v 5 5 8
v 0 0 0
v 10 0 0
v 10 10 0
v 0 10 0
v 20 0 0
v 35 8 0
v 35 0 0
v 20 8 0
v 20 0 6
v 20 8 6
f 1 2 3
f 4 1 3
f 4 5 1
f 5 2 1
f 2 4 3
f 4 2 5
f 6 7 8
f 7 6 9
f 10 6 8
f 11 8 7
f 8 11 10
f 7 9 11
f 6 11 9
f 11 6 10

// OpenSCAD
// Purpose: polyhedron – pyramid and wedge with planar faces (faces clockwise seen from outside).
polyhedron(
    points = [[0, 0, 0], [10, 0, 0], [10, 10, 0], [0, 10, 0], [5, 5, 8]],
    faces = [[0, 1, 4], [1, 2, 4], [2, 3, 4], [3, 0, 4], [1, 0, 3, 2]]
);
translate([20, 0, 0]) polyhedron(
    [[0, 0, 0], [15, 0, 0], [15, 8, 0], [0, 8, 0], [0, 0, 6], [0, 8, 6]],
    [[0, 3, 2, 1], [0, 1, 4], [1, 2, 5, 4], [2, 3, 5], [3, 0, 4, 5]]
);
